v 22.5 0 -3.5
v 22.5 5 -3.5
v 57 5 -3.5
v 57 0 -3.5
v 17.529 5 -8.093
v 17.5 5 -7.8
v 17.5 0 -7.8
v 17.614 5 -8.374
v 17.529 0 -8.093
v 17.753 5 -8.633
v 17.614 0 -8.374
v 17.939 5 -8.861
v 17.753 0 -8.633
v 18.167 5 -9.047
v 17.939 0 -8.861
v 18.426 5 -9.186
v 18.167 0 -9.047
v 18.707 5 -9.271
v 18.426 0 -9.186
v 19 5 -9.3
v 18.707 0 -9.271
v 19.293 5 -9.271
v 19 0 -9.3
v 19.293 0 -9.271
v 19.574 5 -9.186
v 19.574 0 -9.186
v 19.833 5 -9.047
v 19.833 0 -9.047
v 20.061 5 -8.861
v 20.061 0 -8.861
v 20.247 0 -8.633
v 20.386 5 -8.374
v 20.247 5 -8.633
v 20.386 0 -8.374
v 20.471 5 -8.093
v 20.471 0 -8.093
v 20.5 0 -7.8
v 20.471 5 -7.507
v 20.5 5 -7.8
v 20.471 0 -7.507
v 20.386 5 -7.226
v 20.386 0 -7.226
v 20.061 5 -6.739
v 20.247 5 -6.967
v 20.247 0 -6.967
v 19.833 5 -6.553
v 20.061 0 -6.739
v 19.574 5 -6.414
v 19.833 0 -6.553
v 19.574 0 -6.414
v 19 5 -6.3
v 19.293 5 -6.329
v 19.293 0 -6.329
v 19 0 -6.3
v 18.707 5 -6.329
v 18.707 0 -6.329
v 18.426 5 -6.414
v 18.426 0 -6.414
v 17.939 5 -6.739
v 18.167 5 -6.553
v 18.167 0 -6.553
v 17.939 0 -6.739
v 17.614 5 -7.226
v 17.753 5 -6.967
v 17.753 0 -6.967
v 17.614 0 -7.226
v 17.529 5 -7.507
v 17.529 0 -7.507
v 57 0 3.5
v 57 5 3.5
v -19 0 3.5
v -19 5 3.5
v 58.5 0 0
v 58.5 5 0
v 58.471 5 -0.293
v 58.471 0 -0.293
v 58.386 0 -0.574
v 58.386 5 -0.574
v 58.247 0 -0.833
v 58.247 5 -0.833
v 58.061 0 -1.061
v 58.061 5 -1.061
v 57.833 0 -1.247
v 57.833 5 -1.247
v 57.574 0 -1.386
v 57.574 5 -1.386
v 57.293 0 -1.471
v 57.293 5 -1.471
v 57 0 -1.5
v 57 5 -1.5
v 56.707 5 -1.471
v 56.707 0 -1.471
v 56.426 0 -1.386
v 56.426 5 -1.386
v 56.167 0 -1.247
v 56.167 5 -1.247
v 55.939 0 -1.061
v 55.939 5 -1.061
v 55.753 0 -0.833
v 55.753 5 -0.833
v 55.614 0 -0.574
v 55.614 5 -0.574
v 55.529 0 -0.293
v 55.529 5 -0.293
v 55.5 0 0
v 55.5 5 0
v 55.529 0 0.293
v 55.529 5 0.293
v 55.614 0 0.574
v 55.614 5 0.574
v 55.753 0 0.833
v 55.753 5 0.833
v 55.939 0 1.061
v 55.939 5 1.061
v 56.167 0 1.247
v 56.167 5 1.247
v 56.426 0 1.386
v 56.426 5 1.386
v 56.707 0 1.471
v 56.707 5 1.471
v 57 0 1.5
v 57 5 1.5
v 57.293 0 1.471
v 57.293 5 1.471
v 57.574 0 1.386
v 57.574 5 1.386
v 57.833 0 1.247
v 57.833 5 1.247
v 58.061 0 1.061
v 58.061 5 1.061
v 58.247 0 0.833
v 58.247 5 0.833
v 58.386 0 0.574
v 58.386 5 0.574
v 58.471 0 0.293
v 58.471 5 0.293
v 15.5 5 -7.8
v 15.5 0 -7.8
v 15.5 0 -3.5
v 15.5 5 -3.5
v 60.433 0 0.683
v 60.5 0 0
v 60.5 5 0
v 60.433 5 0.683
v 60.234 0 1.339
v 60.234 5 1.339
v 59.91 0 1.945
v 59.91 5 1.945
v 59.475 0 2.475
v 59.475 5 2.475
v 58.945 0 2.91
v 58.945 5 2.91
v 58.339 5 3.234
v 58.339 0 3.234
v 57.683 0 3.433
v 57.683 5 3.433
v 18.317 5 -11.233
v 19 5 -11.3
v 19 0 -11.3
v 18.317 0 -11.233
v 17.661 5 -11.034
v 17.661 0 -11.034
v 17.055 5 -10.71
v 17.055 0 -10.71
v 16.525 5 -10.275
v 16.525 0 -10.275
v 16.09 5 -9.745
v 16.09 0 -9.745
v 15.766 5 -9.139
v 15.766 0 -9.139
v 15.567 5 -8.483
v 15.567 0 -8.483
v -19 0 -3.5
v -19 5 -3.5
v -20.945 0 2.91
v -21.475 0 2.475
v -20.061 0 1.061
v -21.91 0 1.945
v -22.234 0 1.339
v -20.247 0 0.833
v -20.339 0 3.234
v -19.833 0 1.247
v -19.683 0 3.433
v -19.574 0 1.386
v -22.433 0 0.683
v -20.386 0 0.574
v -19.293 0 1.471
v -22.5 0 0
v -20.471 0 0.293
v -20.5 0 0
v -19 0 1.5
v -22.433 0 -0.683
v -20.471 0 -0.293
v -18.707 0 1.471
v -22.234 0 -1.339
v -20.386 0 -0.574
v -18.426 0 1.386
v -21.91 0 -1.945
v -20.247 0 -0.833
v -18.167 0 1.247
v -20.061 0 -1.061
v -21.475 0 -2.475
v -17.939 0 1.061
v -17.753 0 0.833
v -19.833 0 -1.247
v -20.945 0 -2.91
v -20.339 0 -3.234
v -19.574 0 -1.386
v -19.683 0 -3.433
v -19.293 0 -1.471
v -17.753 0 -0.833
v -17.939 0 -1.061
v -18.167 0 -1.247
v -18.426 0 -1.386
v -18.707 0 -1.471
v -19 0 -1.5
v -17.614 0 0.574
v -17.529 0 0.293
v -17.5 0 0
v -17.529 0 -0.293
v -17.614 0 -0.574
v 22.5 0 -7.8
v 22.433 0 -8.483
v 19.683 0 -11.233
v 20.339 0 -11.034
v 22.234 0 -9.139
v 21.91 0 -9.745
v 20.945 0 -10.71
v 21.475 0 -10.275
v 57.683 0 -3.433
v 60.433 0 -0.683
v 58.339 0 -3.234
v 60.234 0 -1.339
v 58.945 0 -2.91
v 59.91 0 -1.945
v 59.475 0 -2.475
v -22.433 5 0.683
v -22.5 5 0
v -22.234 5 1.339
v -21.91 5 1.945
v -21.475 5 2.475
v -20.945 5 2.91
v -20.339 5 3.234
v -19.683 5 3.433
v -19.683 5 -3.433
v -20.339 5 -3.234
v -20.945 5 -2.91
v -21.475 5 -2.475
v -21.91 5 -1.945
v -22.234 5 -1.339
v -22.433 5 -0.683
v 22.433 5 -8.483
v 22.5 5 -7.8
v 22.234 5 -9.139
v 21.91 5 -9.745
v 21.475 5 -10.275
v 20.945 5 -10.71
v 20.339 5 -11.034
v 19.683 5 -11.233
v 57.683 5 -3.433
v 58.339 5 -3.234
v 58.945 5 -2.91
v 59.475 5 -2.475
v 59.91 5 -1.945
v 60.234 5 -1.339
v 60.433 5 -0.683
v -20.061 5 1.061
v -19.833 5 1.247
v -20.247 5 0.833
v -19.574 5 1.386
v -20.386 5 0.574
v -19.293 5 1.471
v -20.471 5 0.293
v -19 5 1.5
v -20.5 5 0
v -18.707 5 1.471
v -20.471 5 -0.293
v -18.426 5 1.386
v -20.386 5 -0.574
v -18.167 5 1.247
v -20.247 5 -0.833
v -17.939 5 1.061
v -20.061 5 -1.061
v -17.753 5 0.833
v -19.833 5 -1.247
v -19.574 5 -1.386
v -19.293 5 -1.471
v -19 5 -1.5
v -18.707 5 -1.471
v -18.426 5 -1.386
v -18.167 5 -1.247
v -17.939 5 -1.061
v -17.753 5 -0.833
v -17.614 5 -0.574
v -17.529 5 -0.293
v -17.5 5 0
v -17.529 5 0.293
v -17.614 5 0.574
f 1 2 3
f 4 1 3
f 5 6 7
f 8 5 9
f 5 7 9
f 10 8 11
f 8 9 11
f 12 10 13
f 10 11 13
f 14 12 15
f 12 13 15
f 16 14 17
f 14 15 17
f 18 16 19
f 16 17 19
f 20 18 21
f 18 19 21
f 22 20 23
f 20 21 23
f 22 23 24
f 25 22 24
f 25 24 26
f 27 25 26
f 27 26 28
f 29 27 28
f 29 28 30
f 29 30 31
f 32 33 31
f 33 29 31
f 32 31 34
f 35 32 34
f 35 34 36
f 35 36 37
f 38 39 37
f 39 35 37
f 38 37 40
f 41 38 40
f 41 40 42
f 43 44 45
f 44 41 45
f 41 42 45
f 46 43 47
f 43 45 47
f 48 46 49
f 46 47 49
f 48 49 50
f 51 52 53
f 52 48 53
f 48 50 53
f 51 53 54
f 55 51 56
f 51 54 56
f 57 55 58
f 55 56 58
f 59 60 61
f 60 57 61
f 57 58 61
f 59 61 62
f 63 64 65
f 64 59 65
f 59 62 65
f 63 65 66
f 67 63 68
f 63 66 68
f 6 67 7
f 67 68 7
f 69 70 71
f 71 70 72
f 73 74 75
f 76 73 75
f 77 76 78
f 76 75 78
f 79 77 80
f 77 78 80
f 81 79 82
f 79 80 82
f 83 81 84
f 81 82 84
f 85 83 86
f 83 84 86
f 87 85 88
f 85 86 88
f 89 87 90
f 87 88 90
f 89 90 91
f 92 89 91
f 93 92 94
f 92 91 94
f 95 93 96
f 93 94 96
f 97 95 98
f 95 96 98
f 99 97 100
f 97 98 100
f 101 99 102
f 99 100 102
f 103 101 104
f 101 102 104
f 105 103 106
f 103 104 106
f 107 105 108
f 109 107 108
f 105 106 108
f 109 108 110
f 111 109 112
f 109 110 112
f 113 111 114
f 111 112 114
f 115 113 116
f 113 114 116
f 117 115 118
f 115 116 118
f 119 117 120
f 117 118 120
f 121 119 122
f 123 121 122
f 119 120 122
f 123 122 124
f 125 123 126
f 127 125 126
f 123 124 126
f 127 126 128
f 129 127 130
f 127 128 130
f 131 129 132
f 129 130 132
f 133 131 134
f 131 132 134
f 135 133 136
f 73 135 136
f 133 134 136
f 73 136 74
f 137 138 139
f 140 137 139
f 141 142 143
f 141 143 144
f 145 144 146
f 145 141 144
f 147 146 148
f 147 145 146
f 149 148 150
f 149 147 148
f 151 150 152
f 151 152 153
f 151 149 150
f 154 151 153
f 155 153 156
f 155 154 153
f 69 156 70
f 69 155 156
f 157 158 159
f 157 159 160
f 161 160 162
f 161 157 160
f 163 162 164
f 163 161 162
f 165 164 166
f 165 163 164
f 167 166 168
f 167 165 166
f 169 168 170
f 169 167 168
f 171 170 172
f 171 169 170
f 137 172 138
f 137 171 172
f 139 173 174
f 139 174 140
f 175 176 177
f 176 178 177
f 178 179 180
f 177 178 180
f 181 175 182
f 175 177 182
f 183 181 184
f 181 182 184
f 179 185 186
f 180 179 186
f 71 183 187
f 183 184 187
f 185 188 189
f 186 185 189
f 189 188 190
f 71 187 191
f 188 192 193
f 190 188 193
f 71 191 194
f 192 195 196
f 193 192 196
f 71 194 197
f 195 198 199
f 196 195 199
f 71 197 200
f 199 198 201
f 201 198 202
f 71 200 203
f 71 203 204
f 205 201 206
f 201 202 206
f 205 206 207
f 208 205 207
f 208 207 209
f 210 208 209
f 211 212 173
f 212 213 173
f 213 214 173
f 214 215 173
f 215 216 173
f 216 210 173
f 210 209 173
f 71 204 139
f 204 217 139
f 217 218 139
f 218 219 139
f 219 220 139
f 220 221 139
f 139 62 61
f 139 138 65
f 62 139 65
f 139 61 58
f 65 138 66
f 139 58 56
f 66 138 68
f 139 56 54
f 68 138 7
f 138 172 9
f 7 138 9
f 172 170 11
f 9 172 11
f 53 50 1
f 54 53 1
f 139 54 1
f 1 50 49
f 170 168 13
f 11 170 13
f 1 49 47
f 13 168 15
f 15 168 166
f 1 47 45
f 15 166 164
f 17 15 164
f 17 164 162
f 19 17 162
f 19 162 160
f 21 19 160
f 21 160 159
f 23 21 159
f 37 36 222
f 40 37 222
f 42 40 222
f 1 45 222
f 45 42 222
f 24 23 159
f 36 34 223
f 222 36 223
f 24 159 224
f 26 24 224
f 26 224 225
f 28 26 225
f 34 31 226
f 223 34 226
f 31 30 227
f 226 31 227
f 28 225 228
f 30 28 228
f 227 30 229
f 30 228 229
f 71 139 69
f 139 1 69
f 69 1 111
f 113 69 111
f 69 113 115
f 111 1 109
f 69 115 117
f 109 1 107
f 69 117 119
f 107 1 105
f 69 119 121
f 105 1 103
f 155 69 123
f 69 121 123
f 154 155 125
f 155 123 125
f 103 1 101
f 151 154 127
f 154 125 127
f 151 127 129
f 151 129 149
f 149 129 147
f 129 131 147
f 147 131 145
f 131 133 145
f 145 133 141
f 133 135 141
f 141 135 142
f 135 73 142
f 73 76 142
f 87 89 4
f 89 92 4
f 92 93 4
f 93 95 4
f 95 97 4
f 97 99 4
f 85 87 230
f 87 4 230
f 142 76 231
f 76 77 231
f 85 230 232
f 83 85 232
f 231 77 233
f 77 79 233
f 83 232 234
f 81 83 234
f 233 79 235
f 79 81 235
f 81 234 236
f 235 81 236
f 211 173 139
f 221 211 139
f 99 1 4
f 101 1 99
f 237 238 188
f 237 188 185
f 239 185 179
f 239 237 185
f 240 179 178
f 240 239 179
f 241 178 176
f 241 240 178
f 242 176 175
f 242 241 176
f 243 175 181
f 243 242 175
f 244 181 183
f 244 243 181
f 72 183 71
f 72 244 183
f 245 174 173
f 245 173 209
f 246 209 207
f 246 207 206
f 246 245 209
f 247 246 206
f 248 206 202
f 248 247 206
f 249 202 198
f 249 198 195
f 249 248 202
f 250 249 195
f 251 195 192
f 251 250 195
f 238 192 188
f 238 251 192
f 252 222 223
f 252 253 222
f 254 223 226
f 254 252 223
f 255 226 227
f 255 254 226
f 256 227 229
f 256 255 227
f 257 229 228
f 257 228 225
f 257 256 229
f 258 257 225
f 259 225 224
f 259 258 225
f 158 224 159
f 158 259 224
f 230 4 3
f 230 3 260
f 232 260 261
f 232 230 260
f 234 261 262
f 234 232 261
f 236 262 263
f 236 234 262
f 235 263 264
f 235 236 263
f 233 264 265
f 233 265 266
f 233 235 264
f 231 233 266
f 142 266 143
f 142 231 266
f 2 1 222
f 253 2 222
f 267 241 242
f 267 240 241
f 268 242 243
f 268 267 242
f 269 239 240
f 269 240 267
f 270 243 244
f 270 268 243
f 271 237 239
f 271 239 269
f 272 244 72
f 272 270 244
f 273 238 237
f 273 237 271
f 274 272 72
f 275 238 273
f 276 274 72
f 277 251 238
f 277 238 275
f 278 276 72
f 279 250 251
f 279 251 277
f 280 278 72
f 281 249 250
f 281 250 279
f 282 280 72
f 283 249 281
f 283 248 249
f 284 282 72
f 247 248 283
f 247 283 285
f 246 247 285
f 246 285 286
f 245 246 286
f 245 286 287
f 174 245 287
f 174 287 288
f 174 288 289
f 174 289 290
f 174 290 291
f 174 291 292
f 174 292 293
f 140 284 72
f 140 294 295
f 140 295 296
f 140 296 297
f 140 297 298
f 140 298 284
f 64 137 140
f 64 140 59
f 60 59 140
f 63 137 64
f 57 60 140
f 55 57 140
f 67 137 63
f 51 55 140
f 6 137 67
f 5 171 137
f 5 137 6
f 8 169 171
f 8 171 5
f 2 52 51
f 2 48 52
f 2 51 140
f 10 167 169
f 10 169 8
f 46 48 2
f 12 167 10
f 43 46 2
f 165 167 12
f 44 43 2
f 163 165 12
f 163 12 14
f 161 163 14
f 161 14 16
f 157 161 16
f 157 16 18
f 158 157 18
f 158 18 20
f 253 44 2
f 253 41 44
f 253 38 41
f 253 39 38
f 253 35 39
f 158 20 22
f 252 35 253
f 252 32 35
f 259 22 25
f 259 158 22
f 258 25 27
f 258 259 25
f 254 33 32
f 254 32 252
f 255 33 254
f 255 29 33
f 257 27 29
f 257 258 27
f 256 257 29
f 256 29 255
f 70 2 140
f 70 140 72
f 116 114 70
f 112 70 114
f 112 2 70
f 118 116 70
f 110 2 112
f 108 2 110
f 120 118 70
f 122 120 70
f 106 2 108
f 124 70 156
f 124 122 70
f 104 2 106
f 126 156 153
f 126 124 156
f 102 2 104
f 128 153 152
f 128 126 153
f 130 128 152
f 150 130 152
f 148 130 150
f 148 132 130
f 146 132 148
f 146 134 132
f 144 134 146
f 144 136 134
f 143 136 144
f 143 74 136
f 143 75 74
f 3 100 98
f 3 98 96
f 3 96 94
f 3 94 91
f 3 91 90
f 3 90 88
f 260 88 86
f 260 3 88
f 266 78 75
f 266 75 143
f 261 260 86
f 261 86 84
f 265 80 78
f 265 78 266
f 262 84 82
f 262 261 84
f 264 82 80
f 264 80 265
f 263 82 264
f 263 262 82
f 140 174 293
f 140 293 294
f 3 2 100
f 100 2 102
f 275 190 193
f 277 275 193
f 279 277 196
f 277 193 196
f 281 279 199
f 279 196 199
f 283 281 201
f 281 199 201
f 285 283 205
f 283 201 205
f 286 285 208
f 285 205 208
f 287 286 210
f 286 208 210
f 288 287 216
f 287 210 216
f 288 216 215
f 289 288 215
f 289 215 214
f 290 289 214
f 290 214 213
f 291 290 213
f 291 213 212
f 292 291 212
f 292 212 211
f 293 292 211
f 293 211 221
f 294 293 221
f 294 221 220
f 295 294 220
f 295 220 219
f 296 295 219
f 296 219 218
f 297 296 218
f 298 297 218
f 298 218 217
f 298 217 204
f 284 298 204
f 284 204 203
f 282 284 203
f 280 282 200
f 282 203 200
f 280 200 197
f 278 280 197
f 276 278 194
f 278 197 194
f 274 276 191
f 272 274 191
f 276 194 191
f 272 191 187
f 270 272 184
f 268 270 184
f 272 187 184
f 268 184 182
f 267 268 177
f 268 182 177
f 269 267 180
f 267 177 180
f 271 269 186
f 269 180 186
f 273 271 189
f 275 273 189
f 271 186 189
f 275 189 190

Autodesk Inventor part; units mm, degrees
ref_plane "YZ Plane" through (0, 0, 0) normal (1, 0, 0) x (0, 1, 0)
ref_plane "XZ Plane" through (0, 0, 0) normal (0, 1, 0) x (-1, 0, 0)
ref_plane "XY Plane" through (0, 0, 0) normal (0, 0, 1) x (1, 0, 0)
sketch "Sketch1" plane through (0, 0, 0) normal (0, 1, 0) x (-1, 0, 0)
  line L0 (-19, -3.5) -> (-19, 3.5)
  line L1 (-19, 3.5) -> (19, 3.5)
  line L2 (19, 3.5) -> (19, -3.5)
  line L3 (19, -3.5) -> (-19, -3.5)
  line L4 (-19, -3.5) -> (19, 3.5) construction
  line L5 (-19, 3.5) -> (19, -3.5) construction
  circle A0 centre (19, 0) radius 1.5
  line L6 (19, 3.5) -> (22.5, 3.5)
  line L7 (22.5, 3.5) -> (22.5, -3.5)
  line L8 (22.5, -3.5) -> (19, -3.5)
  line L9 (19, -3.5) -> (19, 3.5)
  line L10 (-19, 0) -> (-19, -7.8)
  line L11 (-22.5, 14.8) -> (-22.5, -7.8)
  line L12 (-22.5, -7.8) -> (-15.5, -7.8)
  line L13 (-15.5, -7.8) -> (-15.5, 14.8)
  line L14 (-15.5, 14.8) -> (-22.5, 14.8)
  line L15 (-22.5, 14.8) -> (-15.5, -7.8) construction
  line L16 (-22.5, -7.8) -> (-15.5, 14.8) construction
  line L17 (-19, 3.5) -> (-22.5, 3.5)
  circle A1 centre (-19, -7.8) radius 1.5
  line L18 (-15.5, -7.8) -> (-22.5, -7.8)
  line L19 (-22.5, -7.8) -> (-22.5, -11.3)
  line L20 (-22.5, -11.3) -> (-15.5, -11.3)
  line L21 (-15.5, -11.3) -> (-15.5, -7.8)
  point P0 (0, 0)
  point P1 (-22.5, -7.8)
  point P2 (-15.5, -3.5)
  dimension "d0" = 7
  dimension "d1" = 38
  dimension "d2" = 3
  dimension "d3" = 3.5
  dimension "d4" = 7.8
  dimension "d5" = 7
  dimension "d6" = 3
  dimension "d7" = 3.5
extrude "Extrusion1" add sketch "Sketch1" along normal blind 5 contours L10 A1 L12 L11 L17 L0 | L0 L1 L13 L3 | L3 L13 L12 A1 L10 | L13 L1 L2 A0 L3 | L2 A0 L6 L7 L8 | L21 L20 L19 L12 A1
fillet "Fillet1" radius 3.5 5 edges at (22.5, 2.5, -11.3) (15.5, 2.5, -11.3) (22.5, 2.5, 3.5) (-22.5, 2.5, 3.5) (-22.5, 2.5, -3.5)
sketch "Sketch2" plane through (0, 5, 0) normal (0, 1, 0) x (1, 0, 0)
  arc A0 (19, -3.5) -> (22.5, 0) centre (19, 0) ccw projected
  line L0 (22.5, 0) -> (64, 0)
  line L1 (15.5, 3.5) -> (22.5, 3.5)
  line L2 (22.5, 3.5) -> (22.5, -3.5)
  line L3 (22.5, -3.5) -> (15.5, -3.5)
  line L4 (15.5, -3.5) -> (15.5, 3.5)
  line L5 (22.5, -3.5) -> (64, -3.5)
  line L6 (64, -3.5) -> (64, 3.5)
  line L7 (64, 3.5) -> (22.5, 3.5)
  line L8 (22.5, 3.5) -> (22.5, -3.5)
  line L9 (64, 3.5) -> (67.5, 3.5)
  line L10 (67.5, 3.5) -> (67.5, -3.5)
  line L11 (67.5, -3.5) -> (64, -3.5)
  line L12 (64, -3.5) -> (64, 3.5)
  circle A1 centre (64, 0) radius 1.65
  point P0 (0, 0)
  point P1 (22.5, 0)
  point P2 (19, -3.5)
  dimension "d11" = 41.5
  dimension "d12" = 3.5
  dimension "d13" = 3.3
extrude "Extrusion2" add sketch "Sketch2" against normal up to surface (5 mm away) contours A0 L2 L3 | L2 L7 L6 A1 L0 | L0 A1 L6 L5 L2 | L6 A1 L9 L10 L11
fillet "Fillet2" radius 3.5 2 edges at (67.5, 2.5, 3.5) (67.5, 2.5, -3.5)
sketch "Sketch3" plane through (0, 5, 0) normal (0, 1, 0) x (1, 0, 0)
  line L0 (19, 0) -> (57, 0)
  line L1 (19, 0) -> (60.5, 0)
  line L2 (19, 0) -> (60.5, 0) construction
  circle A0 centre (60.5, 0) radius 1.65
  point P0 (0, 0)
  dimension "d17" = 38
  dimension "d18" = 41.5
  dimension "d19" = 0
  dimension "d20" = 3.3
extrude "Extrusion3" cut sketch "Sketch3" against normal blind 10
sketch "Sketch4" plane through (0, 5, 0) normal (0, 1, 0) x (1, 0, 0)
  line L0 (-19, -3.5) -> (64, -3.5) projected
  line L1 (62.2745, -3.5) -> (67.2267, -3.5)
  line L2 (67.2267, -3.5) -> (67.2267, 3.993)
  line L3 (67.2267, 3.993) -> (62.2745, 3.993)
  line L4 (62.2745, 3.993) -> (62.2745, -3.5)
  line L5 (67.2267, 3.993) -> (67.8067, 3.993)
  line L6 (67.8067, 3.993) -> (67.8067, -3.5)
  line L7 (67.8067, -3.5) -> (67.2267, -3.5)
  line L8 (67.2267, -3.5) -> (67.2267, 3.993)
  point P0 (0, 0)
extrude "Extrusion4" cut sketch "Sketch4" against normal blind 10
sketch "Sketch5" plane through (0, 5, 0) normal (0, 1, 0) x (1, 0, 0)
  circle A0 centre (60.5, 0) radius 1.65 projected
  line L0 (60.5, 0) -> (64, 0)
  line L1 (-19, -3.5) -> (62.2745, -3.5) projected
  line L2 (60.5, -3.5) -> (64, -3.5)
  line L3 (64, -3.5) -> (64, 3.5)
  line L4 (64, 3.5) -> (60.5, 3.5)
  line L5 (60.5, 3.5) -> (60.5, -3.5)
  point P0 (0, 0)
  point P1 (60.5, 1.65)
  point P2 (60.5, -1.65)
  dimension "d25" = 3.5
  dimension "d26" = 7
extrude "Extrusion5" add sketch "Sketch5" against normal up to surface (5 mm away) contours L0 L3 L2 L1 L5 A0 | A0 L5 L4 L3 L0
fillet "Fillet3" radius 3.5 2 edges at (64, 2.5, 3.5) (64, 2.5, -3.5)
sketch "Sketch6" plane through (0, 5, 0) normal (0, 1, 0) x (1, 0, 0)
  circle A0 centre (19, 7.8) radius 1.5 projected
  line L0 (19, 7.8) -> (19, 0)
  circle A1 centre (-19, 0) radius 1.5 projected
  line L1 (19, 0) -> (-19, 0)
  line L2 (-19, 0) -> (19, 0)
  line L3 (19, 0) -> (57, 0)
  line L4 (60.5, 3.5) -> (22.5, 3.5) projected
  line L5 (57, 3.5) -> (64.573, 3.5)
  line L6 (64.573, 3.5) -> (64.573, -3.5)
  line L7 (64.573, -3.5) -> (57, -3.5)
  line L8 (57, -3.5) -> (57, 3.5)
  point P0 (0, 0)
  dimension "d30" = 38
extrude "Extrusion6" add sketch "Sketch6" against normal up to surface (5 mm away) contours L5 L6 L7 L8 L4
sketch "Sketch7" plane through (0, 5, 0) normal (0, 1, 0) x (1, 0, 0)
  circle A0 centre (19, 7.8) radius 1.5 projected
  line L0 (19, 7.8) -> (19, 0)
  line L1 (19, 0) -> (57, 0)
  circle A1 centre (57, 0) radius 1.5
  line L2 (57, 0) -> (60.5, 0)
  line L3 (-19, -3.5) -> (64.573, -3.5) projected
  line L4 (64.573, 3.5) -> (22.5, 3.5) projected
  line L5 (60.5, -3.5) -> (64.573, -3.5)
  line L6 (64.573, -3.5) -> (64.573, 3.5)
  line L7 (64.573, 3.5) -> (60.5, 3.5)
  line L8 (60.5, 3.5) -> (60.5, -3.5)
  point P0 (0, 0)
  point P1 (64.573, -3.5)
  dimension "d33" = 7.8
  dimension "d34" = 38
  dimension "d35" = 3
  dimension "d36" = 3.5
extrude "Extrusion7" cut sketch "Sketch7" against normal blind 10 contours A1 L2 L1 | L1 L2 A1 | L8 L4 L6 L3
fillet "Fillet4" radius 3.5 2 edges at (60.5, 2.5, -3.5) (60.5, 2.5, 3.5)
properties part number "connector"
